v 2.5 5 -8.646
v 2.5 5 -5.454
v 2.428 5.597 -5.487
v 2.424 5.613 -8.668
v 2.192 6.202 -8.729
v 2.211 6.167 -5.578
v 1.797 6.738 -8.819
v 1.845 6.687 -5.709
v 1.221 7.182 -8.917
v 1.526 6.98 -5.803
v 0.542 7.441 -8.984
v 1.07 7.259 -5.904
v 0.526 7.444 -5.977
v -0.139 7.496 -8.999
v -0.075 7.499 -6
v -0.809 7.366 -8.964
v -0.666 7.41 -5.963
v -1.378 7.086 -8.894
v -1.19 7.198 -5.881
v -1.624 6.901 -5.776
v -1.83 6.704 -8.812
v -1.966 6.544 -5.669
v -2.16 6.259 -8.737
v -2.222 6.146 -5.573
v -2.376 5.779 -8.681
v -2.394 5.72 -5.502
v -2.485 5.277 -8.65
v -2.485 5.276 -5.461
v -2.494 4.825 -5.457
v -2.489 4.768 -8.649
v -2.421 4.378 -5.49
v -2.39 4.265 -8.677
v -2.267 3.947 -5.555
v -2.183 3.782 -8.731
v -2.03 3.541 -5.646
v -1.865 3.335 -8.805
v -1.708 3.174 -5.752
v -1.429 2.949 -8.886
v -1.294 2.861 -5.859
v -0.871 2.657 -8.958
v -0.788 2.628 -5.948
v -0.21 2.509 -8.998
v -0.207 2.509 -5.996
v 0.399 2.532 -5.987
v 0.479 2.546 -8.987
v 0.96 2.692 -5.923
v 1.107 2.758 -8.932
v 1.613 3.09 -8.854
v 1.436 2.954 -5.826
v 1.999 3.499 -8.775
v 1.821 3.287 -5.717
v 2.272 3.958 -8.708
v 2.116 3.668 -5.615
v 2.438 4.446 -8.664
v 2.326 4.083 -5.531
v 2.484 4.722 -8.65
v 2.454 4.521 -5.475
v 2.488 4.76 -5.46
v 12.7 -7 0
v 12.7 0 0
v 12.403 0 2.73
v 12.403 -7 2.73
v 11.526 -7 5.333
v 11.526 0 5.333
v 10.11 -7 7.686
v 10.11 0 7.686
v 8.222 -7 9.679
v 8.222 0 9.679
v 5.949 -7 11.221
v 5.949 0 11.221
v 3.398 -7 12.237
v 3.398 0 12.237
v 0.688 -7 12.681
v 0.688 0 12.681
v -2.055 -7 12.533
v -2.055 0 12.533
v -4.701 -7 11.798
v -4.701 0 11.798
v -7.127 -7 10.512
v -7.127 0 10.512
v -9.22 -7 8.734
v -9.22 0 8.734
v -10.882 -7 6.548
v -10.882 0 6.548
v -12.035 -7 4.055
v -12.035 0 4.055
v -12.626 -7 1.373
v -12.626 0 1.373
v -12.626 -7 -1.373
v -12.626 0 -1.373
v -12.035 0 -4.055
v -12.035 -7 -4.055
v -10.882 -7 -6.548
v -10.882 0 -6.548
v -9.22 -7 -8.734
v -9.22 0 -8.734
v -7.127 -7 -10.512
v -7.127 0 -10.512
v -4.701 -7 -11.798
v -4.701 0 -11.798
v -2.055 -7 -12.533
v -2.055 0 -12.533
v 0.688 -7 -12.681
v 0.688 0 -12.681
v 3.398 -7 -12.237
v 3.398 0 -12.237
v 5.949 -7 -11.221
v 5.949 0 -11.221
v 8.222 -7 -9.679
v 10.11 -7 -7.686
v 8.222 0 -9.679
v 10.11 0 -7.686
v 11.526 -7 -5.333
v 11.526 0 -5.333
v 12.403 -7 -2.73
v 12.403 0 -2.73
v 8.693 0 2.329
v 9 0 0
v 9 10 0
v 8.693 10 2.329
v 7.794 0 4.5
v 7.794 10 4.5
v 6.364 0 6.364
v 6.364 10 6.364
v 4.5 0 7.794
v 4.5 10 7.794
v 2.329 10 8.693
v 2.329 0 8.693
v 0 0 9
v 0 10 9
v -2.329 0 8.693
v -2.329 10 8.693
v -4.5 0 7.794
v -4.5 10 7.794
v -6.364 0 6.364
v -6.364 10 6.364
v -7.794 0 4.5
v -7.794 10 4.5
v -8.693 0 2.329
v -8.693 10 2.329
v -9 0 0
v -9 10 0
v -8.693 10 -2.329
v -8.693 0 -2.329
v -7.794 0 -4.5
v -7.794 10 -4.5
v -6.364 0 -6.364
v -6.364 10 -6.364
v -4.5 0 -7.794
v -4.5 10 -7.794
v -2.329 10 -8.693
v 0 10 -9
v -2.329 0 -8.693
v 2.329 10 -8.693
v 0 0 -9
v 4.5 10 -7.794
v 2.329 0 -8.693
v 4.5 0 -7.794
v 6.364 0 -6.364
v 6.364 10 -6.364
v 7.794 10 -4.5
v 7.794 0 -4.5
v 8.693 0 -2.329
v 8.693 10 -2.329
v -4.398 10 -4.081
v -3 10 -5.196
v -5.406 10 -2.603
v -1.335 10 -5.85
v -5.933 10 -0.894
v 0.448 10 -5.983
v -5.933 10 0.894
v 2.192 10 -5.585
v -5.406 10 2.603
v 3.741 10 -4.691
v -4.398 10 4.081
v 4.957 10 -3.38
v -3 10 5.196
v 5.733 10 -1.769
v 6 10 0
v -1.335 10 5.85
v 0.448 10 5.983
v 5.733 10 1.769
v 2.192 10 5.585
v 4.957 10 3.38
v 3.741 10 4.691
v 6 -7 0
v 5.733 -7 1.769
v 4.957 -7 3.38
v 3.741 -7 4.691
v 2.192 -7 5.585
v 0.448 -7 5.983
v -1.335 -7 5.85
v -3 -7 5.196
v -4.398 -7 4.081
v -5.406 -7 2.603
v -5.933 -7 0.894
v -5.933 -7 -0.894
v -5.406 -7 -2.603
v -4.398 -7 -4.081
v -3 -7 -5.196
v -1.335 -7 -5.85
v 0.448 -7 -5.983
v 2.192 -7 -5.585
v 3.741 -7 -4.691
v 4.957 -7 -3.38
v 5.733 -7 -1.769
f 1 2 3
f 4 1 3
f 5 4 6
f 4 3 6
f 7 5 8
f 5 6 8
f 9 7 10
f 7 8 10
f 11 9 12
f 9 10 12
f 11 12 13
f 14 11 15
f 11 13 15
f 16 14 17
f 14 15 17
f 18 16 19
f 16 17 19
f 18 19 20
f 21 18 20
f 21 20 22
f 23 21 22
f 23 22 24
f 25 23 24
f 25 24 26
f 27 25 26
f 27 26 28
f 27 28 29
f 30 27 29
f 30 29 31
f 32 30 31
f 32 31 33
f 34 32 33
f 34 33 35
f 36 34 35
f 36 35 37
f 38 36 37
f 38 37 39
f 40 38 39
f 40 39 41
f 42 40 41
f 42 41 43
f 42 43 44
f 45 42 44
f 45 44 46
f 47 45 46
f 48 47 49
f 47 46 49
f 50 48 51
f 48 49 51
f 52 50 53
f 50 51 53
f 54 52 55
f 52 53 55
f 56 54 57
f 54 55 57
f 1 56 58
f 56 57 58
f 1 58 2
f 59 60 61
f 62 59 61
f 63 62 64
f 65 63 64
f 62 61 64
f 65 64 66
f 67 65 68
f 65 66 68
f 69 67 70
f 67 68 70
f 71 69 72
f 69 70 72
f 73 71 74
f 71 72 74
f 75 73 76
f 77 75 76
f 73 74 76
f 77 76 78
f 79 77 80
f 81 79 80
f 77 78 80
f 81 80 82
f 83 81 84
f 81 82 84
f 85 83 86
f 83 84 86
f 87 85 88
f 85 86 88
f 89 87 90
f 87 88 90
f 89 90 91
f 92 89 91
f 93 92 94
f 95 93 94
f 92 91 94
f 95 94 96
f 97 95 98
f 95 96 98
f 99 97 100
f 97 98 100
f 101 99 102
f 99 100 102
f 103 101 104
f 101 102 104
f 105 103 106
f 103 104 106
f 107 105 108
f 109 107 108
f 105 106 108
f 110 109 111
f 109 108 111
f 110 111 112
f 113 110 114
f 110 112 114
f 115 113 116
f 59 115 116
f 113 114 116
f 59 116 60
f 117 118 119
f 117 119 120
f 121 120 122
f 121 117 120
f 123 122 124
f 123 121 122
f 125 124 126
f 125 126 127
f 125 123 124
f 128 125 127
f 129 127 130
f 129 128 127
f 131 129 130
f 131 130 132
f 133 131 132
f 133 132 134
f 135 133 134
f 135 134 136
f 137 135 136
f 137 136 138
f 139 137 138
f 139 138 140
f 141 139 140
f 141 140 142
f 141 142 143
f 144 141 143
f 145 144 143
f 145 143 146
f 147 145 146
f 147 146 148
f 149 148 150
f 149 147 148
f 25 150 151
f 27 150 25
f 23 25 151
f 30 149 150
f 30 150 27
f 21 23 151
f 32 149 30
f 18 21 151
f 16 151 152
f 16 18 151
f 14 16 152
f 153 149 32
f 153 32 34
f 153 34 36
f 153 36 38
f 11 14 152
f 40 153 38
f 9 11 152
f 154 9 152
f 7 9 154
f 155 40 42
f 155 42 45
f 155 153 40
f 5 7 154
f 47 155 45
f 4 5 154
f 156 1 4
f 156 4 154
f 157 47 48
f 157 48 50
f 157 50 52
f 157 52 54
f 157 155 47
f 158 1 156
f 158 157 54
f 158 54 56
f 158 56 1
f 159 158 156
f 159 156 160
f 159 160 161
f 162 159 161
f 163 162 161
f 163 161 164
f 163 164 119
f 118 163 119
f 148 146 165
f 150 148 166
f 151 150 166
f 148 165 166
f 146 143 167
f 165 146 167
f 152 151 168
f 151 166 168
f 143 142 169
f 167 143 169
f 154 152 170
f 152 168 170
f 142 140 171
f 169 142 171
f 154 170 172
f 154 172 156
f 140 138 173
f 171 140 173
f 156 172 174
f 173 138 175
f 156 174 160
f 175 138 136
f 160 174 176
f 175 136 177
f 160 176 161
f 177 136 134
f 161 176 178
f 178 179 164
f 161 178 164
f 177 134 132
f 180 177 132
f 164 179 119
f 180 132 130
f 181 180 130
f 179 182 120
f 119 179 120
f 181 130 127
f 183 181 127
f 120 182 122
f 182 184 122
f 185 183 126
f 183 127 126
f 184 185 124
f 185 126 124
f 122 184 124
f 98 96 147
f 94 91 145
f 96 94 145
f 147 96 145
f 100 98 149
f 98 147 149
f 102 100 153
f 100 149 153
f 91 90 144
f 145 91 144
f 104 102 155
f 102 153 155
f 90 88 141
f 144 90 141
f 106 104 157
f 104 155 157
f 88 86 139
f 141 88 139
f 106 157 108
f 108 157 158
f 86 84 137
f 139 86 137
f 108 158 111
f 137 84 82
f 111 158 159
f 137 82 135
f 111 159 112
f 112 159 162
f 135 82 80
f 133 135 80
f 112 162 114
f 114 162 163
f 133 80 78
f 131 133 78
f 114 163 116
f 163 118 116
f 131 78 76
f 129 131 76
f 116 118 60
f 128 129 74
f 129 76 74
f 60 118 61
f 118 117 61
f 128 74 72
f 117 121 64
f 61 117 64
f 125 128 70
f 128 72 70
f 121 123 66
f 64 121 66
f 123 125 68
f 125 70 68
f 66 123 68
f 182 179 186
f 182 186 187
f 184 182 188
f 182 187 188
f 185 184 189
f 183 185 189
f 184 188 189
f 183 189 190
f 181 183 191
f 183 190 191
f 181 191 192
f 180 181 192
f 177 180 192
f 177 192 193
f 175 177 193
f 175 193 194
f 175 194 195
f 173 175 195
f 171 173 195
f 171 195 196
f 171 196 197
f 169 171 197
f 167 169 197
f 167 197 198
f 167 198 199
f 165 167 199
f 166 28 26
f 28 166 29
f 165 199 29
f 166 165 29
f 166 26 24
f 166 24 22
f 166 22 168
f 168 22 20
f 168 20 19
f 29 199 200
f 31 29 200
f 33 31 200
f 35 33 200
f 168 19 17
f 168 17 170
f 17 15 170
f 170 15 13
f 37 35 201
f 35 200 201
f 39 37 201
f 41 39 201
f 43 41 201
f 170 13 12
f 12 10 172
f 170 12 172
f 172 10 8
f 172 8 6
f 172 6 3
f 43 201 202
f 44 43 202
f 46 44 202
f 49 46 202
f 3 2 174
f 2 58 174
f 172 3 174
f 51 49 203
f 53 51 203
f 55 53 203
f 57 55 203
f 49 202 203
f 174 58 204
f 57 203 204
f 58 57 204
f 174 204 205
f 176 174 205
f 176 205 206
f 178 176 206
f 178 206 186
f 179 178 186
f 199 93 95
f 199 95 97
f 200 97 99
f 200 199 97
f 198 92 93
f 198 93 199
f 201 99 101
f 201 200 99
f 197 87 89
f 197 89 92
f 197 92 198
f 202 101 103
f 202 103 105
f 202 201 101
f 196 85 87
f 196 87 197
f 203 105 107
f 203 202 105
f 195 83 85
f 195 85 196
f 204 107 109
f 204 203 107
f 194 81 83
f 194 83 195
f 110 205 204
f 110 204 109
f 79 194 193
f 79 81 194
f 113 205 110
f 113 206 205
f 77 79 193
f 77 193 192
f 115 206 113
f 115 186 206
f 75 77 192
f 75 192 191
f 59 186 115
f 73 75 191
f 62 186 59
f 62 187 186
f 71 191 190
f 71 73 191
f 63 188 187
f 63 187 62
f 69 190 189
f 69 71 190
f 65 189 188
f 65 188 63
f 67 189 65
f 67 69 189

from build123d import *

# Parameters (mm, degrees)
F0_R     = 12.7
F1_DEPTH = 7
F2_R     = 9
F3_DEPTH = 10
F4_R     = 6
F5_DEPTH = 17.001
F7_D     = 5
F7_DEPTH = 12.701


with BuildPart() as f1:
    # F0 (on Front) → F1 (new body)
    with BuildSketch(Plane.XZ):
        Circle(F0_R)
    extrude(amount=F1_DEPTH)

    # F2 (on Front) → F3 (join)
    with BuildSketch(Plane.XZ):
        Circle(F2_R)
    extrude(amount=-F3_DEPTH)

    # F4 (on face) → F5 (cut, through all)
    with BuildSketch(Plane.XZ.offset(7)):
        Circle(F4_R)
    extrude(amount=-F5_DEPTH, mode=Mode.SUBTRACT)

    # F7 (through all, one way)
    with BuildSketch(Plane.XY):
        with Locations((0, 5)):
            Circle(F7_D / 2)
    extrude(amount=-F7_DEPTH, mode=Mode.SUBTRACT)


solid = f1.part
